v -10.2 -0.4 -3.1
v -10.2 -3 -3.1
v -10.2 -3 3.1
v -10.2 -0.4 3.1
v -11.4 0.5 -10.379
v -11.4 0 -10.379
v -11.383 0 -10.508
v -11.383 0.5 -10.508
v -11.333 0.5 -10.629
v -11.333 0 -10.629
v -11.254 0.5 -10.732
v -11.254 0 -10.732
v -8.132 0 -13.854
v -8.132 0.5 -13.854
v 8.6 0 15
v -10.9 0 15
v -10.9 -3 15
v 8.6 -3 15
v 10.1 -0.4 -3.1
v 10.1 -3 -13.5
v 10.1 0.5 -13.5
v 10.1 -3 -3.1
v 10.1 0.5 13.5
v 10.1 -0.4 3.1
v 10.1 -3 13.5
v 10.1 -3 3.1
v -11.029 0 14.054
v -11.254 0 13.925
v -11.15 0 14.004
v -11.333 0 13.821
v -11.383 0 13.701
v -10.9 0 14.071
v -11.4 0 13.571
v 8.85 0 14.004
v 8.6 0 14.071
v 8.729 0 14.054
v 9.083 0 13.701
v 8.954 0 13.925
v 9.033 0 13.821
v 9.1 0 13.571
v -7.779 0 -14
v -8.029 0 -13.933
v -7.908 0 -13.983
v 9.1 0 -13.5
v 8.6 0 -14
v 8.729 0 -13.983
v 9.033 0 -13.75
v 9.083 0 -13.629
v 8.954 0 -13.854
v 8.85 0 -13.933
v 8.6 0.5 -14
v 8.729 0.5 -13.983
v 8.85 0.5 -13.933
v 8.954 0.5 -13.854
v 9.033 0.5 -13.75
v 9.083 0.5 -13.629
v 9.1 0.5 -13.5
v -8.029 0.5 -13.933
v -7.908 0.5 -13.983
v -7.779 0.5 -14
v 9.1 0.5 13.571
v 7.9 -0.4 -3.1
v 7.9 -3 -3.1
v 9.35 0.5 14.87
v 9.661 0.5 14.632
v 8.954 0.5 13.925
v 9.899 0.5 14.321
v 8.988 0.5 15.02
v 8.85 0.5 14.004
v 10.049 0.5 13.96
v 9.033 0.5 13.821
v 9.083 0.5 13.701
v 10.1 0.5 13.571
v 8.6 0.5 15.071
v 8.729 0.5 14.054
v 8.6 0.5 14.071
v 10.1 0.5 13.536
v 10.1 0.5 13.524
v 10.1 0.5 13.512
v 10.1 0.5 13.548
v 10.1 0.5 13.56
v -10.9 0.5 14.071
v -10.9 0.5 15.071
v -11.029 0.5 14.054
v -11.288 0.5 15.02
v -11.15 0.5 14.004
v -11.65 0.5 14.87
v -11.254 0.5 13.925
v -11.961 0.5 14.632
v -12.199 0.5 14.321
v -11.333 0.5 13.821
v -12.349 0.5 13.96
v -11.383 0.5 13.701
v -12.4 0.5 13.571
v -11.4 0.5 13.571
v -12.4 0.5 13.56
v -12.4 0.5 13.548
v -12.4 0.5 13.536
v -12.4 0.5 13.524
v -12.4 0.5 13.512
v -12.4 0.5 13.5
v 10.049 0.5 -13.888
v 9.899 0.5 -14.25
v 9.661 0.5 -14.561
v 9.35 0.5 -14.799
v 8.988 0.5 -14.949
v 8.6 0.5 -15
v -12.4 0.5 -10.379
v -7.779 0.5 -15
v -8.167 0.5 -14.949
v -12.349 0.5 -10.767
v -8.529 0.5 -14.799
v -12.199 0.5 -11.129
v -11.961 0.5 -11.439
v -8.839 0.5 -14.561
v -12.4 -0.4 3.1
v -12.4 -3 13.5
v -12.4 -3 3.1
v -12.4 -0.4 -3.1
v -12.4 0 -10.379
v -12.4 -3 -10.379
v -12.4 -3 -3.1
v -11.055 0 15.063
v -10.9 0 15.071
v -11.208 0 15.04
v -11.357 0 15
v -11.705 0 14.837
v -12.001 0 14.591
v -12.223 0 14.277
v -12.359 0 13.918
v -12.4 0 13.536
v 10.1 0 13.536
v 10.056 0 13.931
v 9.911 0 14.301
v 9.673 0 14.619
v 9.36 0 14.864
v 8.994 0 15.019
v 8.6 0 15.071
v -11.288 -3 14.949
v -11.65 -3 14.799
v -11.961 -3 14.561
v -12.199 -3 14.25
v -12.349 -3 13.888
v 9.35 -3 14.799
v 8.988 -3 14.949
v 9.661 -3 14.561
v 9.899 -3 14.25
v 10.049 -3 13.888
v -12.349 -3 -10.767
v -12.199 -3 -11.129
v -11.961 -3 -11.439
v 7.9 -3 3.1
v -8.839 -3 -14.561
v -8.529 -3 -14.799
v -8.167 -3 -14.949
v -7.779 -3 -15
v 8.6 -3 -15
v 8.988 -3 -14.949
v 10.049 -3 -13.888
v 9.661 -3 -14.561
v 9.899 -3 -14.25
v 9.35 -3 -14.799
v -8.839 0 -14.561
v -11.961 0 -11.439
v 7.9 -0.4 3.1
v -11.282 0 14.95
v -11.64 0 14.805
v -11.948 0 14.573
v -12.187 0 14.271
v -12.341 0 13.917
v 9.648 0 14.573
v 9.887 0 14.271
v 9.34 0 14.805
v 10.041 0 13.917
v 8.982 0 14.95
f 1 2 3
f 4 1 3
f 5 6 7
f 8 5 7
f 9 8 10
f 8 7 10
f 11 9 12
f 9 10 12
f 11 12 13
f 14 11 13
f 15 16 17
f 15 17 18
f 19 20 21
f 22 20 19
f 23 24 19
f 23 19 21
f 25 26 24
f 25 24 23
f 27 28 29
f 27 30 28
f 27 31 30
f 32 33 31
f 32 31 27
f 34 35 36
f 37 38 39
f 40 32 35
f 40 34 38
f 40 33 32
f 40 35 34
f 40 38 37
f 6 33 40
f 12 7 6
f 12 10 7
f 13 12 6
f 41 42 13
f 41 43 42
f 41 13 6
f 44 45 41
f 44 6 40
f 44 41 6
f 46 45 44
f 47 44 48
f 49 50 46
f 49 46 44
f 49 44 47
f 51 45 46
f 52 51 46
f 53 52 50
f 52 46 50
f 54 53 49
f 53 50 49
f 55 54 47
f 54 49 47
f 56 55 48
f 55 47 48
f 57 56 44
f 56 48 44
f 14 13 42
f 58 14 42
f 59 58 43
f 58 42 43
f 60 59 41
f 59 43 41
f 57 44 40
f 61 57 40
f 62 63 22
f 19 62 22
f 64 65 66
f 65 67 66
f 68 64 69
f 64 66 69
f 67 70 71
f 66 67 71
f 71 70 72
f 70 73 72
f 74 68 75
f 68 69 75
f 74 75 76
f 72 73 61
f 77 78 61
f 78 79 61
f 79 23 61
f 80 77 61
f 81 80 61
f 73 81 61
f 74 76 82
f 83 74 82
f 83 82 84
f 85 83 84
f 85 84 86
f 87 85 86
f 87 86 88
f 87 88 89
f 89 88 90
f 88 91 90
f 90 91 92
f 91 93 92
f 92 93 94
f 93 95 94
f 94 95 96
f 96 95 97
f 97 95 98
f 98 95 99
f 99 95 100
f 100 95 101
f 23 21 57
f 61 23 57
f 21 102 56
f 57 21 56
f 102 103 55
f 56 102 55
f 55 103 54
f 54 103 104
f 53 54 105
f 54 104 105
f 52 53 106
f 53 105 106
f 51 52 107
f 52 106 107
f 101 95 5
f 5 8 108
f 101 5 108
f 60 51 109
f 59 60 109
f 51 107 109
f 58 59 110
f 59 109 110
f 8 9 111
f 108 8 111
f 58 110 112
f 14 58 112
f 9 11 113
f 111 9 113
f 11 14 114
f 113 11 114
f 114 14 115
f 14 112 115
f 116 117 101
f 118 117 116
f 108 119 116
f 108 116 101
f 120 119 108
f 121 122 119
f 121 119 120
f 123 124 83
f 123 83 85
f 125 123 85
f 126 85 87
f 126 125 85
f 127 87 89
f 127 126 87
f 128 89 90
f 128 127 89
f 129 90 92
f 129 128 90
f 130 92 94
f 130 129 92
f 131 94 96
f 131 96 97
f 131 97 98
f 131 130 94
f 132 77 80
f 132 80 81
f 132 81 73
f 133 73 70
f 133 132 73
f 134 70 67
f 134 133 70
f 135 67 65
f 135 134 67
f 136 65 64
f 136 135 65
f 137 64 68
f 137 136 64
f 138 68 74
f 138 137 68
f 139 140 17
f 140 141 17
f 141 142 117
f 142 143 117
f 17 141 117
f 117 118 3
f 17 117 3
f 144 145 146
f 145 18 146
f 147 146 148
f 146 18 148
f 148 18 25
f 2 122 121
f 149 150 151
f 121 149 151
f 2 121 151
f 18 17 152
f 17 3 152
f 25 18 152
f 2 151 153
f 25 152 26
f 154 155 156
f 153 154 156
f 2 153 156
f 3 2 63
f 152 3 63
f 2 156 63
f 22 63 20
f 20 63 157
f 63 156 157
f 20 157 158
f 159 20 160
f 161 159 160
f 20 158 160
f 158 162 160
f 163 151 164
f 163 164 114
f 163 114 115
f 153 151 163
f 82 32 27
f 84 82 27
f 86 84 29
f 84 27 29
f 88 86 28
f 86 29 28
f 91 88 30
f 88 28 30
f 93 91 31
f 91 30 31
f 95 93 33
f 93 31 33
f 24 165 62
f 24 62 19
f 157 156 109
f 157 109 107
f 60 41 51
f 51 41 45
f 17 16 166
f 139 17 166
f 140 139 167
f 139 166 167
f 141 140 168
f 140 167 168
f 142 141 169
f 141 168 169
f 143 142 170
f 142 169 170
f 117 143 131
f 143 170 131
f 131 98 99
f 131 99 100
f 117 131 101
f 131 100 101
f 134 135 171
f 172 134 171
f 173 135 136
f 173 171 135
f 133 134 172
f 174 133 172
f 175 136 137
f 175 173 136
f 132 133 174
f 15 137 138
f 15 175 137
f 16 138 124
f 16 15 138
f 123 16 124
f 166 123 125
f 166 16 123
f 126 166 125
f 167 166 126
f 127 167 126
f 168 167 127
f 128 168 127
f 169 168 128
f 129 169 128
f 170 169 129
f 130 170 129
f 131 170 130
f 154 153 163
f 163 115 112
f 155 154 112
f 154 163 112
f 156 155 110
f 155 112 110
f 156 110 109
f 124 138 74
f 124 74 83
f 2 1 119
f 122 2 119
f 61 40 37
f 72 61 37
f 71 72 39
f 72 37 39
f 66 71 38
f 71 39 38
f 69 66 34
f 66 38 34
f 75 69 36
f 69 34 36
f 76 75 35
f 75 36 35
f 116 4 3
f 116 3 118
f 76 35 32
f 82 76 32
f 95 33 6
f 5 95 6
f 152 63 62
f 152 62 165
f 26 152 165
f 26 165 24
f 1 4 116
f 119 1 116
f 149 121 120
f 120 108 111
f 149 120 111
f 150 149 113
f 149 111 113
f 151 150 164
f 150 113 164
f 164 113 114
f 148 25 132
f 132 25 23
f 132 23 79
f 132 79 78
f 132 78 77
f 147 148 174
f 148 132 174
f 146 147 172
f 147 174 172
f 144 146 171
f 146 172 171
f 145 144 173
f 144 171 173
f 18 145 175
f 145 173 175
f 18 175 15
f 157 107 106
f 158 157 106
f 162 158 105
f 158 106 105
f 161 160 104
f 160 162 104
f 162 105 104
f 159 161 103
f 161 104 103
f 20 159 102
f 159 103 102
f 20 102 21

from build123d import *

# Parameters (mm, degrees)
BODY_DEPTH             = 3
MAGNET_CUTOUT_SKETCH_W = 2.2
MAGNET_CUTOUT_SKETCH_H = 6.2
MAGNET_CUTOUT_DEPTH    = 2.6
BORDER_DEPTH           = 0.5
FILLET_1_R             = 1.5


with BuildPart() as part:
    # surface_sketch → body (new body)
    with BuildSketch(Plane(origin=(0, 0, 0), x_dir=(1, 0, 0), z_dir=(0, 1, 0))):
        Polygon((-12.4, -15), (10.1, -15), (10.1, 15), (-8.4, 15), (-12.4, 11), align=None)
    extrude(amount=-BODY_DEPTH)

    # magnet_cutout_sketch → magnet_cutout (cut)
    with BuildSketch(Plane.XZ.offset(3)):
        with Locations((9, 0)):
            Rectangle(MAGNET_CUTOUT_SKETCH_W, MAGNET_CUTOUT_SKETCH_H)
    magnet_cutout = extrude(amount=-MAGNET_CUTOUT_DEPTH, mode=Mode.SUBTRACT)

    # magnet_cutout_mirror: magnet_cutout across plane
    add(magnet_cutout.mirror(Plane(origin=(-1.15, 0, 0), x_dir=(0, 0, 1), z_dir=(1, 0, 0))), mode=Mode.SUBTRACT)

    # border_sketch → border (add)
    with BuildSketch(Plane(origin=(0, 0, 0), x_dir=(1, 0, 0), z_dir=(0, 1, 0))):
        with BuildLine():
            Line((-7.778679656, 15), (8.6, 15))
            ThreePointArc((8.6, 15), (9.660660172, 14.560660172), (10.1, 13.5))
            Line((10.1, 13.5), (10.1, -13.571428571))
            ThreePointArc((10.1, -13.571428571), (9.660660172, -14.632088743), (8.6, -15.071428571))
            Line((8.6, -15.071428571), (-10.9, -15.071428571))
            ThreePointArc((-10.9, -15.071428571), (-11.960660172, -14.632088743), (-12.4, -13.571428571))
            Line((-12.4, -13.571428571), (-12.4, 10.378679656))
            ThreePointArc((-12.4, 10.378679656), (-12.285819299, 10.952704805), (-11.960660172, 11.439339828))
            Line((-11.960660172, 11.439339828), (-8.839339828, 14.560660172))
            ThreePointArc((-8.839339828, 14.560660172), (-8.352704805, 14.885819299), (-7.778679656, 15))
        make_face()
        with BuildLine():
            Line((-7.778679656, 14), (8.6, 14))
            ThreePointArc((8.6, 14), (8.953553391, 13.853553391), (9.1, 13.5))
            Line((9.1, 13.5), (9.1, -13.571428571))
            ThreePointArc((9.1, -13.571428571), (8.953553391, -13.924981962), (8.6, -14.071428571))
            Line((8.6, -14.071428571), (-10.9, -14.071428571))
            ThreePointArc((-10.9, -14.071428571), (-11.253553391, -13.924981962), (-11.4, -13.571428571))
            Line((-11.4, -13.571428571), (-11.4, 10.378679656))
            ThreePointArc((-11.4, 10.378679656), (-11.361939766, 10.570021373), (-11.253553391, 10.732233047))
            Line((-11.253553391, 10.732233047), (-8.132233047, 13.853553391))
            ThreePointArc((-8.132233047, 13.853553391), (-7.970021373, 13.961939766), (-7.778679656, 14))
        make_face(mode=Mode.SUBTRACT)
    extrude(amount=BORDER_DEPTH)

    # Скругление1
    # the kernel refuses this fillet: 1.5 mm, written as the material it takes off along each edge
    with BuildSketch(Plane(origin=(10.1, 3.75, 15), x_dir=(-1, 0, 0), z_dir=(0, -1, 0))) as fillet_1_piece_1_section:
        with BuildLine():
            CenterArc((FILLET_1_R, FILLET_1_R), FILLET_1_R, 180, 90)
            Line((0, FILLET_1_R), (0, 0))
            Line((0, 0), (FILLET_1_R, 0))
        make_face()
    fillet_1_piece_1 = extrude(amount=10.5, mode=Mode.PRIVATE)
    fillet_1_piece_1 = fillet_1_piece_1 - Plane(origin=(8.6, 0.25, 13.571428571), x_dir=(1, 0, 0), z_dir=(0, -1, 0)) * Cylinder(1.5, 27, mode=Mode.PRIVATE)
    add(fillet_1_piece_1, mode=Mode.SUBTRACT)
    with BuildSketch(Plane(origin=(10.1, 0, 15), x_dir=(-1, 0, 0), z_dir=(0, -1, 0))) as fillet_1_piece_2:
        with BuildLine():
            CenterArc((FILLET_1_R, FILLET_1_R), FILLET_1_R, 180, 90)
            Line((0, FILLET_1_R), (0, 0))
            Line((0, 0), (FILLET_1_R, 0))
        make_face()
    extrude(amount=6.75, mode=Mode.SUBTRACT)
    with BuildSketch(Plane(origin=(10.1, 3.75, -15), x_dir=(0, 0, 1), z_dir=(0, -1, 0))) as fillet_1_piece_3:
        with BuildLine():
            CenterArc((FILLET_1_R, FILLET_1_R), FILLET_1_R, 180, 90)
            Line((0, FILLET_1_R), (0, 0))
            Line((0, 0), (FILLET_1_R, 0))
        make_face()
    extrude(amount=10.5, mode=Mode.SUBTRACT)
    with BuildSketch(Plane(origin=(-12.4, 3.75, 15), x_dir=(1, 0, 0), z_dir=(0, -1, 0))) as fillet_1_piece_4_section:
        with BuildLine():
            CenterArc((FILLET_1_R, -FILLET_1_R), FILLET_1_R, 90, 90)
            Line((0, -FILLET_1_R), (0, 0))
            Line((0, 0), (FILLET_1_R, 0))
        make_face()
    fillet_1_piece_4 = extrude(amount=10.5, mode=Mode.PRIVATE)
    fillet_1_piece_4 = fillet_1_piece_4 - Plane(origin=(-10.9, 0.25, 13.571428571), x_dir=(0, 0, 1), z_dir=(0, -1, 0)) * Cylinder(1.5, 27, mode=Mode.PRIVATE)
    add(fillet_1_piece_4, mode=Mode.SUBTRACT)
    with BuildSketch(Plane(origin=(-12.4, 0, 15), x_dir=(1, 0, 0), z_dir=(0, -1, 0))) as fillet_1_piece_5:
        with BuildLine():
            CenterArc((FILLET_1_R, -FILLET_1_R), FILLET_1_R, 90, 90)
            Line((0, -FILLET_1_R), (0, 0))
            Line((0, 0), (FILLET_1_R, 0))
        make_face()
    extrude(amount=6.75, mode=Mode.SUBTRACT)
    with BuildSketch(Plane(origin=(-8.4, 1.553300859, -15), x_dir=(-0.7071067811865476, 0, 0.7071067811865476), z_dir=(0, -1, 0)), Plane(origin=(-12.4, 1.553300859, -11), x_dir=(0, 0, 1), z_dir=(0, -1, 0))) as fillet_1_piece_6:
        with BuildLine():
            CenterArc((FILLET_1_R * 0.414213562373, -FILLET_1_R), FILLET_1_R, 90, 45)
            Line((-FILLET_1_R * 0.292893218813, -FILLET_1_R * 0.292893218813), (0, 0))
            Line((0, 0), (FILLET_1_R * 0.414213562373, 0))
        make_face()
    extrude(amount=6.106601718, mode=Mode.SUBTRACT)


solid = part.part
